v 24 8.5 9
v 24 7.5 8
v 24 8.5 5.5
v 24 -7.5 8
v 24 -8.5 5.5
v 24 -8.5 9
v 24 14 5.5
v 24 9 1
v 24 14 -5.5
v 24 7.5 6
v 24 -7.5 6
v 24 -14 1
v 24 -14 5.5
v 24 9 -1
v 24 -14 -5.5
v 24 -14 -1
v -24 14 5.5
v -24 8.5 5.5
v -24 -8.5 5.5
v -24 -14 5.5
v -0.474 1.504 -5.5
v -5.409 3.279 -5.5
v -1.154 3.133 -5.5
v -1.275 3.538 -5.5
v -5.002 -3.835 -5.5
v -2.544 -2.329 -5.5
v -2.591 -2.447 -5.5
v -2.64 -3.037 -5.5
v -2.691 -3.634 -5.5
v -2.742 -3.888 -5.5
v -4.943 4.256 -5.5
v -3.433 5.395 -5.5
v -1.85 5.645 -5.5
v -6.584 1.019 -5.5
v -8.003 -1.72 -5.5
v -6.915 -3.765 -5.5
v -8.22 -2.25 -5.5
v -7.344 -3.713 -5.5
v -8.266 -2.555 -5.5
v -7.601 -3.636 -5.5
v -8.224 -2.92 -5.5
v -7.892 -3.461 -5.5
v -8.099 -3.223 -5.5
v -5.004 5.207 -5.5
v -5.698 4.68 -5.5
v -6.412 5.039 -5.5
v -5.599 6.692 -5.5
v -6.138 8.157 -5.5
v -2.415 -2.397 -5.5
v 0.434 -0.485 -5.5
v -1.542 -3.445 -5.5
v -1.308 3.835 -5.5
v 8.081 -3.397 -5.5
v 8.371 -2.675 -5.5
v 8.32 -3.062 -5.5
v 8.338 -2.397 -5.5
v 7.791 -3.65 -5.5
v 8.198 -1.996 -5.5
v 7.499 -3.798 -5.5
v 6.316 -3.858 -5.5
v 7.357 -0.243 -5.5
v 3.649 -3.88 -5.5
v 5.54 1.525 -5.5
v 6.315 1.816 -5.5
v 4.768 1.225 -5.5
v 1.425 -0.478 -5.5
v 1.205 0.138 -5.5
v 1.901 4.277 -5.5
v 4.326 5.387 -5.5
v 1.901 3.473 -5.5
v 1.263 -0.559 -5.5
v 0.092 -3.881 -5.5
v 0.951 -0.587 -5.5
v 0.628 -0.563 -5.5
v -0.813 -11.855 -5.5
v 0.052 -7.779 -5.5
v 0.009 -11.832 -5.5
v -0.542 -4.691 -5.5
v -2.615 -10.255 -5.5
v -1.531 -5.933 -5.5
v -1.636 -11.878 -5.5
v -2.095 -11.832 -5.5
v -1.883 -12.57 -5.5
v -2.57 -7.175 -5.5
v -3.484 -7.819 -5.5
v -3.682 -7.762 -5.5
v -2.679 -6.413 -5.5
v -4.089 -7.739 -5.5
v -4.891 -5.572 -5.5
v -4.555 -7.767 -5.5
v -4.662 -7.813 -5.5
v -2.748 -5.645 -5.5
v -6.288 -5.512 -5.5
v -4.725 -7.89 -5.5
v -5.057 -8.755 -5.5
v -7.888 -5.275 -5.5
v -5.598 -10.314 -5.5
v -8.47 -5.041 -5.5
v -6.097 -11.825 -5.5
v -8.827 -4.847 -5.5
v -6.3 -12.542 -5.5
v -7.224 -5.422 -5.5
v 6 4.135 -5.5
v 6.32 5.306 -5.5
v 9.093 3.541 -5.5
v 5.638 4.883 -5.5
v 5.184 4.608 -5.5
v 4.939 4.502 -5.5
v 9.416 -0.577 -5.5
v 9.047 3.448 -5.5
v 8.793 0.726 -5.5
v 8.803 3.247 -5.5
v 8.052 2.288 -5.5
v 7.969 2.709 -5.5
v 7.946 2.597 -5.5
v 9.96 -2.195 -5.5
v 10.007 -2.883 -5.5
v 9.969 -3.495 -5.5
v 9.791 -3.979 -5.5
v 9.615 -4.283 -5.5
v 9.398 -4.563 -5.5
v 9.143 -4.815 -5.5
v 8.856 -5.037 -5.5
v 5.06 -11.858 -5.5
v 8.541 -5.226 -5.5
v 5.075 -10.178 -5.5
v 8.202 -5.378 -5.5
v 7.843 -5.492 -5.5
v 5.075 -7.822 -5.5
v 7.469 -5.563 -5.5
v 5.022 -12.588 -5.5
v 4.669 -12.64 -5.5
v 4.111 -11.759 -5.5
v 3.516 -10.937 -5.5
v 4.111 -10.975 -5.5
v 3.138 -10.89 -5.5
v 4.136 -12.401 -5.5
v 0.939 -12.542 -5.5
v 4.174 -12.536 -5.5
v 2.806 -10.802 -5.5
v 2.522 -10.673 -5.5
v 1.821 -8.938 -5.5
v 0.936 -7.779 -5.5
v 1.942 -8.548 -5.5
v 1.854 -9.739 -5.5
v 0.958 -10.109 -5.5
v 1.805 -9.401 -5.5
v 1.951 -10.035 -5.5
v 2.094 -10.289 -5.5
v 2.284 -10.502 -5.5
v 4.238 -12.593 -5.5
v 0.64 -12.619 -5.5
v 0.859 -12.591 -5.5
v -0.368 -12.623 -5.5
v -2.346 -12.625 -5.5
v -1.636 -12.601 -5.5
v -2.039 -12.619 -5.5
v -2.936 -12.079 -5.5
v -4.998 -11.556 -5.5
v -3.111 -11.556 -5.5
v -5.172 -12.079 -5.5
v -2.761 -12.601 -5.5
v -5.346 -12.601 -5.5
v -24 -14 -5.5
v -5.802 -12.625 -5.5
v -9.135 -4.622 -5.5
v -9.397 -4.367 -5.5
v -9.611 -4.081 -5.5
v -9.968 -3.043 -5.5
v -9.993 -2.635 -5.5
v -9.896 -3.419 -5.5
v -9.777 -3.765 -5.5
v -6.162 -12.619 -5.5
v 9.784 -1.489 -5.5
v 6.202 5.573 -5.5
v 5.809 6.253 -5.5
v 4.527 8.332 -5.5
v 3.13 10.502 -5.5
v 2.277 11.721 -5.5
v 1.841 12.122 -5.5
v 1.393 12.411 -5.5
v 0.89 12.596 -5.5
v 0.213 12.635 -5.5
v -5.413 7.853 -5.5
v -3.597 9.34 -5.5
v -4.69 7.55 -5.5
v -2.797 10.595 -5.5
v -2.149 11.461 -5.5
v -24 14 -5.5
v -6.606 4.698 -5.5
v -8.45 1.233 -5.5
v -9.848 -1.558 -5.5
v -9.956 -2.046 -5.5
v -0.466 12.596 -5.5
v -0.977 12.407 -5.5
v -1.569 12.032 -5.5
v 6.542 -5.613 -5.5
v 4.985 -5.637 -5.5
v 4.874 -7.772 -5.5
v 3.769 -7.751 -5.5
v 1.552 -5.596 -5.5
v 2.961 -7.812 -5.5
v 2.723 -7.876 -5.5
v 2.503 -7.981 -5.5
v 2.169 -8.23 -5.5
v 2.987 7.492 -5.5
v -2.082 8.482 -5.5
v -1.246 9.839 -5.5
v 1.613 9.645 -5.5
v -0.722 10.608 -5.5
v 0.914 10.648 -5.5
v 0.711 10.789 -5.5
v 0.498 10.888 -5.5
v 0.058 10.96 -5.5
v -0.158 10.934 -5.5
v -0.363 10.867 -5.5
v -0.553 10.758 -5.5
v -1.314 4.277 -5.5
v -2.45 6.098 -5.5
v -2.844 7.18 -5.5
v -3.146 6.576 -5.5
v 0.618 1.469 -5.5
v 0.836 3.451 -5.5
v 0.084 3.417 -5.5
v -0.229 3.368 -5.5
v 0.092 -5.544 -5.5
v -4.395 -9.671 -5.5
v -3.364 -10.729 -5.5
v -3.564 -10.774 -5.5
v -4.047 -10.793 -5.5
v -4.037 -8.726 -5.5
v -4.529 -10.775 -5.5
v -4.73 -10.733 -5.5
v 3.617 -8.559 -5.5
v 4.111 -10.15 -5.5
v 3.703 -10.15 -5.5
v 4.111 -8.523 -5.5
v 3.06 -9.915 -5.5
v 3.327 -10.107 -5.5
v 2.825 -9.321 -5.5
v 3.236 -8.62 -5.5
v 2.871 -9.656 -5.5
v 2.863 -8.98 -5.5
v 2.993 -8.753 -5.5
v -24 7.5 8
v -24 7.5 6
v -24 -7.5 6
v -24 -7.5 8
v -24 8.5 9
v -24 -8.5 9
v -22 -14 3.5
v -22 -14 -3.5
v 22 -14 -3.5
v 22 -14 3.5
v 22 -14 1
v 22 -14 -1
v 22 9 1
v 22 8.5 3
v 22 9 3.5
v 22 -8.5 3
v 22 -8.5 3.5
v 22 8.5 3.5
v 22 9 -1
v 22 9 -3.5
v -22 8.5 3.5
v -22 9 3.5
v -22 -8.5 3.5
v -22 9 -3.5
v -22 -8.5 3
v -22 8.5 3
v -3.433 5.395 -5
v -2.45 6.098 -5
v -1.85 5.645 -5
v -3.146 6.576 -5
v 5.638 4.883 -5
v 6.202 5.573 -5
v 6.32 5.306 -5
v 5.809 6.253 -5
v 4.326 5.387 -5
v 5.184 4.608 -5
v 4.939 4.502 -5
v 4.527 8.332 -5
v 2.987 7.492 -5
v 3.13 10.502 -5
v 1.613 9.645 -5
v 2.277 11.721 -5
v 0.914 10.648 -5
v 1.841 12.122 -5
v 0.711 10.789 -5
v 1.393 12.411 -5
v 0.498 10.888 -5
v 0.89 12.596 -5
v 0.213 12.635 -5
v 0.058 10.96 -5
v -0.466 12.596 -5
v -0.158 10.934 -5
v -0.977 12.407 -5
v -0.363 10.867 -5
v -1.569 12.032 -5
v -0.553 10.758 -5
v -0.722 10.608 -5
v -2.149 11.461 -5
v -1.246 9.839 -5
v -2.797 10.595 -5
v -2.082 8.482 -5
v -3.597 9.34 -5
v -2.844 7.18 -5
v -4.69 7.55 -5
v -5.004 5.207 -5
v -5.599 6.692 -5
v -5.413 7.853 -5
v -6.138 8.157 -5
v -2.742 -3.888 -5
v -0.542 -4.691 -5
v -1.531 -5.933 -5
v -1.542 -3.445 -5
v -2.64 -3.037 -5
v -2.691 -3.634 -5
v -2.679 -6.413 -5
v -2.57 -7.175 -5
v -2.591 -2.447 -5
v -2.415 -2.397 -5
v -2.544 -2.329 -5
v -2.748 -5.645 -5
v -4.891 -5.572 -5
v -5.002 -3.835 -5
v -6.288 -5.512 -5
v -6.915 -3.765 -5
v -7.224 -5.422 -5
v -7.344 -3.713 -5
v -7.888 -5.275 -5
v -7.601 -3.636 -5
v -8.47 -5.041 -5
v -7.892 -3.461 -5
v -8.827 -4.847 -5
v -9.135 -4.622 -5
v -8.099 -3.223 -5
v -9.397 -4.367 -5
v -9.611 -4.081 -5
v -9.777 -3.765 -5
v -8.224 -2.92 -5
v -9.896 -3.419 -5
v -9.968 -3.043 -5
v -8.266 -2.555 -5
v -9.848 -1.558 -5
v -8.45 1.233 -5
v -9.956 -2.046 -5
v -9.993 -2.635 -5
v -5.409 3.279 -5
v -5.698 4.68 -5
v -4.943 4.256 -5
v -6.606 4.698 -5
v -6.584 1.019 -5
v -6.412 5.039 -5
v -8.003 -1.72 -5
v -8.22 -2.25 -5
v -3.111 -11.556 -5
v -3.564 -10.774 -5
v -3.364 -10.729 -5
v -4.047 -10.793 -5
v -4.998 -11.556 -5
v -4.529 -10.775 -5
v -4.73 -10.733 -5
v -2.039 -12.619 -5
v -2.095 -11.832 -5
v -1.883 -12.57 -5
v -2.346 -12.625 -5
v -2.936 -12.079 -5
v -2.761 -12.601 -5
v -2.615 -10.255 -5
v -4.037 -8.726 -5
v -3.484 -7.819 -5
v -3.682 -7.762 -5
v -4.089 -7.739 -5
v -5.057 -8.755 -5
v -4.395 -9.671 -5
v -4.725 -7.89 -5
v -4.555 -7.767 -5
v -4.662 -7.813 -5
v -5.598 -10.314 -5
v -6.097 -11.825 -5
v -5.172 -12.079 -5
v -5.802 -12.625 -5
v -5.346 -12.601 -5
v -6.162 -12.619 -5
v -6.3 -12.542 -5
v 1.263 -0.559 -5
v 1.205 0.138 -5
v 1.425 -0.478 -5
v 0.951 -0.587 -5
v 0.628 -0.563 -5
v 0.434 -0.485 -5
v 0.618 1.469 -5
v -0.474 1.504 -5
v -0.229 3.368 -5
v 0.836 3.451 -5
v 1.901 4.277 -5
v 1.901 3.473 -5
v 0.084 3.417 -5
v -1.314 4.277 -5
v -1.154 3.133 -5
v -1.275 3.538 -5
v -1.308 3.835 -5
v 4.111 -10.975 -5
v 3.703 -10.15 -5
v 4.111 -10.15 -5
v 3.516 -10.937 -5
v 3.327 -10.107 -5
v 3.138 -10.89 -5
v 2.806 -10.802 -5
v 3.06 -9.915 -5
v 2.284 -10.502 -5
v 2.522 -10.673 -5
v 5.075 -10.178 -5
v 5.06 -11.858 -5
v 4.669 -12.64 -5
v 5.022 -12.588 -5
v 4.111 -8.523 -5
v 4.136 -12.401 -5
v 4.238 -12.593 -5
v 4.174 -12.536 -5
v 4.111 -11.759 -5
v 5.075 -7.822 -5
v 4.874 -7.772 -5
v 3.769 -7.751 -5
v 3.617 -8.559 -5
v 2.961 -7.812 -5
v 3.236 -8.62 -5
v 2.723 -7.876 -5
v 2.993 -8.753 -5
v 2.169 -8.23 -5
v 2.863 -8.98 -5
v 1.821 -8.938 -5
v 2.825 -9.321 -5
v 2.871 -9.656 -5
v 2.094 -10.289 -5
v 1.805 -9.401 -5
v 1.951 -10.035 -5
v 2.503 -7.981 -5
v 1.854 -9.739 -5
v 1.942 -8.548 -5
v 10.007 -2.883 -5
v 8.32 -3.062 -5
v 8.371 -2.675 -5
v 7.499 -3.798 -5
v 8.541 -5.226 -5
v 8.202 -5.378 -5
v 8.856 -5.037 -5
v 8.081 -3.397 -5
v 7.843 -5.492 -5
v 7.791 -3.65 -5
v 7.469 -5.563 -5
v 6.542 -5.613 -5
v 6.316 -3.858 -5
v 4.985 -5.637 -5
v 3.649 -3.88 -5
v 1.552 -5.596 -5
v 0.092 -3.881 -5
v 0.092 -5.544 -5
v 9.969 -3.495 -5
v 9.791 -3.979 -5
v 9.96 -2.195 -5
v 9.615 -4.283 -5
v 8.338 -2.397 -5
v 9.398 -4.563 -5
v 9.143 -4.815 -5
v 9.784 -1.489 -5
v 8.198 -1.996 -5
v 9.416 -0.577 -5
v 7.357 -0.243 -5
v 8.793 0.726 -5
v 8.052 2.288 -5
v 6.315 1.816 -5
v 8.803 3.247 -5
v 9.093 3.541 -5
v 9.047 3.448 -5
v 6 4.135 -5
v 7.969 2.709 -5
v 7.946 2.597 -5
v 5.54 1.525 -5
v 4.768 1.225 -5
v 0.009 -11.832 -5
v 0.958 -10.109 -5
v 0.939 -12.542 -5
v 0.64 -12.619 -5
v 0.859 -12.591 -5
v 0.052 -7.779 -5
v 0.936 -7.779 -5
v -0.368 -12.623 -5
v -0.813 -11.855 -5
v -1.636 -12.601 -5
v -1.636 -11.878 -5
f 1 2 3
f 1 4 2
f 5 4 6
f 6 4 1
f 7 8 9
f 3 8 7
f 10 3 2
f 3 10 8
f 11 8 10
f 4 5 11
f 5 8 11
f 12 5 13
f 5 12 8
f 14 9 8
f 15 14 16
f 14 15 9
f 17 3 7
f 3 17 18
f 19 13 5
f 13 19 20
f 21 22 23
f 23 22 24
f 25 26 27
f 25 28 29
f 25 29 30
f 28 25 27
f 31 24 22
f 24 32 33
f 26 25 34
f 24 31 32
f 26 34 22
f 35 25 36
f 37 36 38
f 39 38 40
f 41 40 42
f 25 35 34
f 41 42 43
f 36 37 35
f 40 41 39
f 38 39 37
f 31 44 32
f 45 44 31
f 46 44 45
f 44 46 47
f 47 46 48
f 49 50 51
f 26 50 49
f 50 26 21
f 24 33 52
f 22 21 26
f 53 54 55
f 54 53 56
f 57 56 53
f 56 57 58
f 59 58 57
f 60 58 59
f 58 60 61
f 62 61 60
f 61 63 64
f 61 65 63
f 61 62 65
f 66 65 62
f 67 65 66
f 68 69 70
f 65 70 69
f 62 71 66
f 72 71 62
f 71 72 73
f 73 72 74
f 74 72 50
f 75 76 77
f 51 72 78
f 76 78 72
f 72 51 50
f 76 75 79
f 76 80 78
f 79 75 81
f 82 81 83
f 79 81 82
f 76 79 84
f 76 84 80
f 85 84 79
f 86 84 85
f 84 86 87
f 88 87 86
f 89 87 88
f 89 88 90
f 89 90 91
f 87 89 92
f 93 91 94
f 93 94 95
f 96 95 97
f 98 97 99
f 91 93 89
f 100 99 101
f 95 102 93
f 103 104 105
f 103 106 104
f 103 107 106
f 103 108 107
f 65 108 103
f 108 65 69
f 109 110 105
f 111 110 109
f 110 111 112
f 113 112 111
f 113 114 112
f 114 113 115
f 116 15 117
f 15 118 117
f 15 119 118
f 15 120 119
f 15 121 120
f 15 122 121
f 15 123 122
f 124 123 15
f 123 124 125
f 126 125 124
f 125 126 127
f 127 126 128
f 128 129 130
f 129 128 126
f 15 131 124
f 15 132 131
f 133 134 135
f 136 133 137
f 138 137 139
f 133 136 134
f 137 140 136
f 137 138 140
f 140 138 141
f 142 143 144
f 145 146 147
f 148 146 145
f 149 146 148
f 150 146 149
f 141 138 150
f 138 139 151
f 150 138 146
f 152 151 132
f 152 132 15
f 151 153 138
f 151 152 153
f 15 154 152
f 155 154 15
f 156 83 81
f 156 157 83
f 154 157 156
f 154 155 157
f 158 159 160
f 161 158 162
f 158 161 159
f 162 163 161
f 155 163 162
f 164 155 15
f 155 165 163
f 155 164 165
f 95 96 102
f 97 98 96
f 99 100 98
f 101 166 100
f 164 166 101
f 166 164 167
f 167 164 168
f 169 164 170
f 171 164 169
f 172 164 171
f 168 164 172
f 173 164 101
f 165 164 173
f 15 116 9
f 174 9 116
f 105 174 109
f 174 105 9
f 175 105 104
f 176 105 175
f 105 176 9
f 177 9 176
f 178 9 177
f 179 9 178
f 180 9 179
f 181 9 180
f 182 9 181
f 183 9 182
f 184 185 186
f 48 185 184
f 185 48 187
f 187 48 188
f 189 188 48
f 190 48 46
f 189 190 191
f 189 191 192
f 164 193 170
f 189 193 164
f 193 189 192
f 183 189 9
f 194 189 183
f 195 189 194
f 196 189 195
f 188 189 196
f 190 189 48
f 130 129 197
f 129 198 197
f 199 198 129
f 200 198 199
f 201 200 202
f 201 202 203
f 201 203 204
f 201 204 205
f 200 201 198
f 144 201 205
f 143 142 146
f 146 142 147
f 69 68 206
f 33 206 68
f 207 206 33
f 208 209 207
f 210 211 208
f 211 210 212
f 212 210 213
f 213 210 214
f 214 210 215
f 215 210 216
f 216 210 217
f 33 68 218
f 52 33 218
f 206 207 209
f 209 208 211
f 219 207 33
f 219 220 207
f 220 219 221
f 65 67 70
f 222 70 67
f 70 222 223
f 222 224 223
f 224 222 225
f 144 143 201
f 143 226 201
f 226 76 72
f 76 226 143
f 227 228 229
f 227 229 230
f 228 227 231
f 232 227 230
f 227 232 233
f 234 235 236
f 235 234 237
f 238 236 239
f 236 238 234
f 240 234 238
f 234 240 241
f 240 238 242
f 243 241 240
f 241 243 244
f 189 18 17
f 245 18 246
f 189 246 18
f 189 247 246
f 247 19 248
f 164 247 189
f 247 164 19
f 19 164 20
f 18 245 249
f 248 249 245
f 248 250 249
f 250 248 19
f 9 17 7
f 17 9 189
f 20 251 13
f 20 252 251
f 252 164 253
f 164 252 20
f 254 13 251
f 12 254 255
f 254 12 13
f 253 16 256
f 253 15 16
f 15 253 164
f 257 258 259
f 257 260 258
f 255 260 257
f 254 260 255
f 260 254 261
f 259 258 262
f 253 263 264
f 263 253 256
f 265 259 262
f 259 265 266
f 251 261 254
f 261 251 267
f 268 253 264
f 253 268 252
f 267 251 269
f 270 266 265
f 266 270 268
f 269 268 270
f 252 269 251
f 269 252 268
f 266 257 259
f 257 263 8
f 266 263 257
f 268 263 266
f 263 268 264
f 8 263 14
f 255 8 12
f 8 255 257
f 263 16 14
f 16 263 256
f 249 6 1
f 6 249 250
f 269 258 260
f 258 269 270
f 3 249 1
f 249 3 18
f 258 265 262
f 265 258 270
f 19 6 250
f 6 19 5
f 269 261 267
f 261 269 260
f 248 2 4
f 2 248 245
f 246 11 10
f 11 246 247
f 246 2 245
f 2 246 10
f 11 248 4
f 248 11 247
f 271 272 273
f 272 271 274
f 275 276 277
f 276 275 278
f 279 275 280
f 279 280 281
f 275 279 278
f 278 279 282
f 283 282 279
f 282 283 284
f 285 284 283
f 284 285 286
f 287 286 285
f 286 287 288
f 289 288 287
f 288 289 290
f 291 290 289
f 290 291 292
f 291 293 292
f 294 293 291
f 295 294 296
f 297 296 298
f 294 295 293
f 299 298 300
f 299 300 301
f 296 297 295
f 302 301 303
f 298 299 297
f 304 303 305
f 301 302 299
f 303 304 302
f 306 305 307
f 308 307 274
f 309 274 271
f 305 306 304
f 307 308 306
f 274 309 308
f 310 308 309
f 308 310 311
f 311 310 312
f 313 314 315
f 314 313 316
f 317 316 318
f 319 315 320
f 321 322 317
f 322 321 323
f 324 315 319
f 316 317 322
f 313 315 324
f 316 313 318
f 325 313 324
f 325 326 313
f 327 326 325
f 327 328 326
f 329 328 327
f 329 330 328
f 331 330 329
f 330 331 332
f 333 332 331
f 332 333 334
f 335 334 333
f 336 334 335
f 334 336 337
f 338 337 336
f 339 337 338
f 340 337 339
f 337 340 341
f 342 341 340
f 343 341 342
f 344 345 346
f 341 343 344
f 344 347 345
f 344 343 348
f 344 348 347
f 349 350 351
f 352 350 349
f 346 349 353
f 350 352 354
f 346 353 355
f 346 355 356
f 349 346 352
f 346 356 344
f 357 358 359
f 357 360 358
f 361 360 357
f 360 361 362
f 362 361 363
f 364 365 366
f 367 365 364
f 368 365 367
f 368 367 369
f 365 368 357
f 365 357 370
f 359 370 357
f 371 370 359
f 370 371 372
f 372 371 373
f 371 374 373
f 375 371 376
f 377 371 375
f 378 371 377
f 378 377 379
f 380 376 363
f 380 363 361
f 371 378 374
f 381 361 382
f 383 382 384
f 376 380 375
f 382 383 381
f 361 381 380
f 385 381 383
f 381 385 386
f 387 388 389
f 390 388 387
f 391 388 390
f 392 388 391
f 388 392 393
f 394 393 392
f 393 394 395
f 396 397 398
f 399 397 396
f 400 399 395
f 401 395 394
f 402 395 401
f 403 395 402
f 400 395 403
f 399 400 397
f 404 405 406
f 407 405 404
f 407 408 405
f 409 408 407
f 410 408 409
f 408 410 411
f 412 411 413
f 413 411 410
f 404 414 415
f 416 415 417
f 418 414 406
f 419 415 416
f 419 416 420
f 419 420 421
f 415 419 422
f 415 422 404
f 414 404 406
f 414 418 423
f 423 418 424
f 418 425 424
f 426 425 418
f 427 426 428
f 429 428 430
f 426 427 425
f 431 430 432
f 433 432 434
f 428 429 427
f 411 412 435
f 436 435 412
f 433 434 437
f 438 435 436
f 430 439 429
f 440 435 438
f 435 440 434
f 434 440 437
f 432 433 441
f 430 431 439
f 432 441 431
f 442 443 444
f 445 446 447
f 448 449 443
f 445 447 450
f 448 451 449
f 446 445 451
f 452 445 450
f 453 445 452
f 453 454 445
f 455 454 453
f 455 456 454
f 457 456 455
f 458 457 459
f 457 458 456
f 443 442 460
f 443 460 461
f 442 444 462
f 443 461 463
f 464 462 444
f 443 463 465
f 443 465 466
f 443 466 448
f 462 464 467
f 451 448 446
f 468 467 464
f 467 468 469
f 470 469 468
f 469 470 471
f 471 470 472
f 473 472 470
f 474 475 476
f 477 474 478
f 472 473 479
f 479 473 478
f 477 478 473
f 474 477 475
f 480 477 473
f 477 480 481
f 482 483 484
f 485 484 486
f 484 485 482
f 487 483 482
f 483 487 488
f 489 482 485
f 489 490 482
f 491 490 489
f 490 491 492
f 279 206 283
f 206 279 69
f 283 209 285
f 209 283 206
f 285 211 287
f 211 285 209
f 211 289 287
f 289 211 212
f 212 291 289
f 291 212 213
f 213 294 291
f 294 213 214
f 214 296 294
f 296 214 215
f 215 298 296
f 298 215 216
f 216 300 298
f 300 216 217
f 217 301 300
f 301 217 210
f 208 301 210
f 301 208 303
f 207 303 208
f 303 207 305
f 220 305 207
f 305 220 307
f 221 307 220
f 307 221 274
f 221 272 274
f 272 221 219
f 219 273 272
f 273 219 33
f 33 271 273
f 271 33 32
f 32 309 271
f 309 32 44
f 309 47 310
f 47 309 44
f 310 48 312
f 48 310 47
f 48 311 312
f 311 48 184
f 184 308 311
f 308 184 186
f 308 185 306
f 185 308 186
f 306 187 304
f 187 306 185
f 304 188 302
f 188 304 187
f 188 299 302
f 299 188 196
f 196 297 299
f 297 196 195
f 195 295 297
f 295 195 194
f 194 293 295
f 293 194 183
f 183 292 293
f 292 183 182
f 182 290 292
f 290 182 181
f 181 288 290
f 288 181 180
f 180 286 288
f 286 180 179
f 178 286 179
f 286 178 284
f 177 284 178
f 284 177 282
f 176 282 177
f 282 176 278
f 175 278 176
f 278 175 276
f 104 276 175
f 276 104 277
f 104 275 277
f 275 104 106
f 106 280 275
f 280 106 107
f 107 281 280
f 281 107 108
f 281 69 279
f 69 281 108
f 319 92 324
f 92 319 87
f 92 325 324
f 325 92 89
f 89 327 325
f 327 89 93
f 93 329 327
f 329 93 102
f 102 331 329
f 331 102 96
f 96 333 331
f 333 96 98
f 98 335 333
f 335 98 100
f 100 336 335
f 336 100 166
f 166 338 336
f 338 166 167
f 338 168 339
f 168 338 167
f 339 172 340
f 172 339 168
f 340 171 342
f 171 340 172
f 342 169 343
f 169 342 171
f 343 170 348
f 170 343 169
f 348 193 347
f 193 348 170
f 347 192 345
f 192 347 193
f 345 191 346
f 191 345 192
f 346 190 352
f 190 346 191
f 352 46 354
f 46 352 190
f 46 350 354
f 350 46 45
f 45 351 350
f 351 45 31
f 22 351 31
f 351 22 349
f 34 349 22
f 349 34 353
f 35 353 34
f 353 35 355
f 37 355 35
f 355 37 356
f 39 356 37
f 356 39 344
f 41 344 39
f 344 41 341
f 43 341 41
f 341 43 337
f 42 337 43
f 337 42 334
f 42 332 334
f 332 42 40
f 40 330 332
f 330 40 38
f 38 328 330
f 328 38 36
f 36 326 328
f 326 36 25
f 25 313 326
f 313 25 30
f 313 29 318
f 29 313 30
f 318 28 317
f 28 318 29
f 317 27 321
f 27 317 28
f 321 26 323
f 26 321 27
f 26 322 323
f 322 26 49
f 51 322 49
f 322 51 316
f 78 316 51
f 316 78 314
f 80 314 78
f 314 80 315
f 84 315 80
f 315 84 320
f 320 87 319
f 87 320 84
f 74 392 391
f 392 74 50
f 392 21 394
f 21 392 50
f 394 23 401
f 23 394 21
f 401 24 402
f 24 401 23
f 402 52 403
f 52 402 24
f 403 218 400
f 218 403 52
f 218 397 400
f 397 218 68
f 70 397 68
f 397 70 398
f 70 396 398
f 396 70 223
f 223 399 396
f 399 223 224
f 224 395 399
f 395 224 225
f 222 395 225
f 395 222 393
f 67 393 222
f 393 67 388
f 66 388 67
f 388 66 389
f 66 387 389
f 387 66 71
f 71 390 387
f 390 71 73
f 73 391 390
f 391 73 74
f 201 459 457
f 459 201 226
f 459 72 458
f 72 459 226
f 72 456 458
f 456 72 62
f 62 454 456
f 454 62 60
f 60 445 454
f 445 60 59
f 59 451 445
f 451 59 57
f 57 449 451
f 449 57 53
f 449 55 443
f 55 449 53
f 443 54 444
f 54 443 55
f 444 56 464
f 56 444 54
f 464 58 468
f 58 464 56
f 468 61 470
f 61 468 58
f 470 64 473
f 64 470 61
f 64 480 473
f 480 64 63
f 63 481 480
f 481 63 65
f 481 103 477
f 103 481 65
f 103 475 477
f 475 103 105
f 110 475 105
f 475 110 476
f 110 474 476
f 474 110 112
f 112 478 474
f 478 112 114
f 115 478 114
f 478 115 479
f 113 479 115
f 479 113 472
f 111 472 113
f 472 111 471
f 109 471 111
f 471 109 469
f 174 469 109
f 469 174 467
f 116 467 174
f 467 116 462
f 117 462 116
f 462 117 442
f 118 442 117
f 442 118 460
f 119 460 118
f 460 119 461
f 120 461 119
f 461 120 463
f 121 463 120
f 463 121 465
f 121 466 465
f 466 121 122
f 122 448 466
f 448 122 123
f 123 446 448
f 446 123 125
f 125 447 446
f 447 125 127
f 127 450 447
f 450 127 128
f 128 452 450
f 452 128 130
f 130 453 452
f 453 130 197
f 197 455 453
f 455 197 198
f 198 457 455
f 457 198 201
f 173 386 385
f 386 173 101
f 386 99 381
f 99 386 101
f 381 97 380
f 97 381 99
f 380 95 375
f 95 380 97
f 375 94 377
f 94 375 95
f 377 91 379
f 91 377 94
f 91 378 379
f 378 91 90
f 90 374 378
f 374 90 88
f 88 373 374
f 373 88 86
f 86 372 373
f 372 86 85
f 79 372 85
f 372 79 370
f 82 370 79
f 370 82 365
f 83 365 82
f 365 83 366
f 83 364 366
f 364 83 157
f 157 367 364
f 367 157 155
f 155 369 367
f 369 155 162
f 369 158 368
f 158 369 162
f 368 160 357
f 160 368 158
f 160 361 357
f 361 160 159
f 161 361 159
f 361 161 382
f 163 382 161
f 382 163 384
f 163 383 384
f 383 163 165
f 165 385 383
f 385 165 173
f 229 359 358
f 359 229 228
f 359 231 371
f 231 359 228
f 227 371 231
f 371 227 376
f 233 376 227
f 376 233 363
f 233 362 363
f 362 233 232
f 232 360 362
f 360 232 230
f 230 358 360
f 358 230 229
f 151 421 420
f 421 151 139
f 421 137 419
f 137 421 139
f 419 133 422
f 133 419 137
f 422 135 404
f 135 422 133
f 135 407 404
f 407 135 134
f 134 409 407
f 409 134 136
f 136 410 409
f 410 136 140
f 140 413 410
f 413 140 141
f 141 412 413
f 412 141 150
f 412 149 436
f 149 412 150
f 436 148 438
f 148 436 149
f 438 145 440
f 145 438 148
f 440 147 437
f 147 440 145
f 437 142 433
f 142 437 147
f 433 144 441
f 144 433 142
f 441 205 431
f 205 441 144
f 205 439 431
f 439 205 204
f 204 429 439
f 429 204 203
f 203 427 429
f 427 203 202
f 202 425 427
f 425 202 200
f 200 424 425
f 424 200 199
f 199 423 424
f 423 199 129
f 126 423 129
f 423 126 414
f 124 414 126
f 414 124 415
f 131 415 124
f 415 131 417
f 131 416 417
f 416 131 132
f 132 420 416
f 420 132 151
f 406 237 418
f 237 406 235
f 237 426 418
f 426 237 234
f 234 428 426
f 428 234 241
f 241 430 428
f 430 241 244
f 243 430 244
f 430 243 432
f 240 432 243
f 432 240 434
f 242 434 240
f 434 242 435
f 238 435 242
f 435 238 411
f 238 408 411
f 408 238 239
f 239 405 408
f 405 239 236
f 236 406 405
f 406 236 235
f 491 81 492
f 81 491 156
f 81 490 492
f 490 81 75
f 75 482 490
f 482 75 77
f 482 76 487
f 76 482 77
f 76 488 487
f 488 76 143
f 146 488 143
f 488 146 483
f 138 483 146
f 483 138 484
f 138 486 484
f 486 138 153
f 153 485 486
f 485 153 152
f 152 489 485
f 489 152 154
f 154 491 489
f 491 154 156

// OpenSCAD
// Models to hold a 470 mAh battery (43mm x 23mm x 6mm)
// Includes an additional piece for threading a strap,
// like on a pair of goggles.

// This model has the opening in the side
module side_hold()
{
  difference() {
    cube([46, 28, 11], center = true);
    translate([2,0,0]) cube([44, 24, 7], center = true);
  }

  translate([0,0,7]) {
    difference() {
      cube([46, 17, 4], center = true);
      translate([0,0,0]) cube([48, 15, 1], center = true);
    }
  }
}

// This model has the opening in the top w/groove for wires
module top_hold()
{
  difference() {
    cube([48, 28, 11], center = true);
    translate([0,-3,0]) cube([44, 24, 7], center = true);
    translate([22,-6,0]) cube([5, 30, 2], center = true);
  }

  translate([0,0,6]) {
    difference() {
      cube([48, 17, 6], center = true);
      translate([0,0,1]) cube([50, 15, 2], center = true);
    }
  }
}

module recycling_symbol()
{
  linear_extrude(height=10, center=false) translate([-70.28/2,-88.77/2,0]) import("pla7.dxf");
}

difference() {
  //side_hold();
  top_hold();
  rotate(a=[0,180,0]) translate([0,0,5]) resize([20,0,0], auto=true) recycling_symbol();
}
